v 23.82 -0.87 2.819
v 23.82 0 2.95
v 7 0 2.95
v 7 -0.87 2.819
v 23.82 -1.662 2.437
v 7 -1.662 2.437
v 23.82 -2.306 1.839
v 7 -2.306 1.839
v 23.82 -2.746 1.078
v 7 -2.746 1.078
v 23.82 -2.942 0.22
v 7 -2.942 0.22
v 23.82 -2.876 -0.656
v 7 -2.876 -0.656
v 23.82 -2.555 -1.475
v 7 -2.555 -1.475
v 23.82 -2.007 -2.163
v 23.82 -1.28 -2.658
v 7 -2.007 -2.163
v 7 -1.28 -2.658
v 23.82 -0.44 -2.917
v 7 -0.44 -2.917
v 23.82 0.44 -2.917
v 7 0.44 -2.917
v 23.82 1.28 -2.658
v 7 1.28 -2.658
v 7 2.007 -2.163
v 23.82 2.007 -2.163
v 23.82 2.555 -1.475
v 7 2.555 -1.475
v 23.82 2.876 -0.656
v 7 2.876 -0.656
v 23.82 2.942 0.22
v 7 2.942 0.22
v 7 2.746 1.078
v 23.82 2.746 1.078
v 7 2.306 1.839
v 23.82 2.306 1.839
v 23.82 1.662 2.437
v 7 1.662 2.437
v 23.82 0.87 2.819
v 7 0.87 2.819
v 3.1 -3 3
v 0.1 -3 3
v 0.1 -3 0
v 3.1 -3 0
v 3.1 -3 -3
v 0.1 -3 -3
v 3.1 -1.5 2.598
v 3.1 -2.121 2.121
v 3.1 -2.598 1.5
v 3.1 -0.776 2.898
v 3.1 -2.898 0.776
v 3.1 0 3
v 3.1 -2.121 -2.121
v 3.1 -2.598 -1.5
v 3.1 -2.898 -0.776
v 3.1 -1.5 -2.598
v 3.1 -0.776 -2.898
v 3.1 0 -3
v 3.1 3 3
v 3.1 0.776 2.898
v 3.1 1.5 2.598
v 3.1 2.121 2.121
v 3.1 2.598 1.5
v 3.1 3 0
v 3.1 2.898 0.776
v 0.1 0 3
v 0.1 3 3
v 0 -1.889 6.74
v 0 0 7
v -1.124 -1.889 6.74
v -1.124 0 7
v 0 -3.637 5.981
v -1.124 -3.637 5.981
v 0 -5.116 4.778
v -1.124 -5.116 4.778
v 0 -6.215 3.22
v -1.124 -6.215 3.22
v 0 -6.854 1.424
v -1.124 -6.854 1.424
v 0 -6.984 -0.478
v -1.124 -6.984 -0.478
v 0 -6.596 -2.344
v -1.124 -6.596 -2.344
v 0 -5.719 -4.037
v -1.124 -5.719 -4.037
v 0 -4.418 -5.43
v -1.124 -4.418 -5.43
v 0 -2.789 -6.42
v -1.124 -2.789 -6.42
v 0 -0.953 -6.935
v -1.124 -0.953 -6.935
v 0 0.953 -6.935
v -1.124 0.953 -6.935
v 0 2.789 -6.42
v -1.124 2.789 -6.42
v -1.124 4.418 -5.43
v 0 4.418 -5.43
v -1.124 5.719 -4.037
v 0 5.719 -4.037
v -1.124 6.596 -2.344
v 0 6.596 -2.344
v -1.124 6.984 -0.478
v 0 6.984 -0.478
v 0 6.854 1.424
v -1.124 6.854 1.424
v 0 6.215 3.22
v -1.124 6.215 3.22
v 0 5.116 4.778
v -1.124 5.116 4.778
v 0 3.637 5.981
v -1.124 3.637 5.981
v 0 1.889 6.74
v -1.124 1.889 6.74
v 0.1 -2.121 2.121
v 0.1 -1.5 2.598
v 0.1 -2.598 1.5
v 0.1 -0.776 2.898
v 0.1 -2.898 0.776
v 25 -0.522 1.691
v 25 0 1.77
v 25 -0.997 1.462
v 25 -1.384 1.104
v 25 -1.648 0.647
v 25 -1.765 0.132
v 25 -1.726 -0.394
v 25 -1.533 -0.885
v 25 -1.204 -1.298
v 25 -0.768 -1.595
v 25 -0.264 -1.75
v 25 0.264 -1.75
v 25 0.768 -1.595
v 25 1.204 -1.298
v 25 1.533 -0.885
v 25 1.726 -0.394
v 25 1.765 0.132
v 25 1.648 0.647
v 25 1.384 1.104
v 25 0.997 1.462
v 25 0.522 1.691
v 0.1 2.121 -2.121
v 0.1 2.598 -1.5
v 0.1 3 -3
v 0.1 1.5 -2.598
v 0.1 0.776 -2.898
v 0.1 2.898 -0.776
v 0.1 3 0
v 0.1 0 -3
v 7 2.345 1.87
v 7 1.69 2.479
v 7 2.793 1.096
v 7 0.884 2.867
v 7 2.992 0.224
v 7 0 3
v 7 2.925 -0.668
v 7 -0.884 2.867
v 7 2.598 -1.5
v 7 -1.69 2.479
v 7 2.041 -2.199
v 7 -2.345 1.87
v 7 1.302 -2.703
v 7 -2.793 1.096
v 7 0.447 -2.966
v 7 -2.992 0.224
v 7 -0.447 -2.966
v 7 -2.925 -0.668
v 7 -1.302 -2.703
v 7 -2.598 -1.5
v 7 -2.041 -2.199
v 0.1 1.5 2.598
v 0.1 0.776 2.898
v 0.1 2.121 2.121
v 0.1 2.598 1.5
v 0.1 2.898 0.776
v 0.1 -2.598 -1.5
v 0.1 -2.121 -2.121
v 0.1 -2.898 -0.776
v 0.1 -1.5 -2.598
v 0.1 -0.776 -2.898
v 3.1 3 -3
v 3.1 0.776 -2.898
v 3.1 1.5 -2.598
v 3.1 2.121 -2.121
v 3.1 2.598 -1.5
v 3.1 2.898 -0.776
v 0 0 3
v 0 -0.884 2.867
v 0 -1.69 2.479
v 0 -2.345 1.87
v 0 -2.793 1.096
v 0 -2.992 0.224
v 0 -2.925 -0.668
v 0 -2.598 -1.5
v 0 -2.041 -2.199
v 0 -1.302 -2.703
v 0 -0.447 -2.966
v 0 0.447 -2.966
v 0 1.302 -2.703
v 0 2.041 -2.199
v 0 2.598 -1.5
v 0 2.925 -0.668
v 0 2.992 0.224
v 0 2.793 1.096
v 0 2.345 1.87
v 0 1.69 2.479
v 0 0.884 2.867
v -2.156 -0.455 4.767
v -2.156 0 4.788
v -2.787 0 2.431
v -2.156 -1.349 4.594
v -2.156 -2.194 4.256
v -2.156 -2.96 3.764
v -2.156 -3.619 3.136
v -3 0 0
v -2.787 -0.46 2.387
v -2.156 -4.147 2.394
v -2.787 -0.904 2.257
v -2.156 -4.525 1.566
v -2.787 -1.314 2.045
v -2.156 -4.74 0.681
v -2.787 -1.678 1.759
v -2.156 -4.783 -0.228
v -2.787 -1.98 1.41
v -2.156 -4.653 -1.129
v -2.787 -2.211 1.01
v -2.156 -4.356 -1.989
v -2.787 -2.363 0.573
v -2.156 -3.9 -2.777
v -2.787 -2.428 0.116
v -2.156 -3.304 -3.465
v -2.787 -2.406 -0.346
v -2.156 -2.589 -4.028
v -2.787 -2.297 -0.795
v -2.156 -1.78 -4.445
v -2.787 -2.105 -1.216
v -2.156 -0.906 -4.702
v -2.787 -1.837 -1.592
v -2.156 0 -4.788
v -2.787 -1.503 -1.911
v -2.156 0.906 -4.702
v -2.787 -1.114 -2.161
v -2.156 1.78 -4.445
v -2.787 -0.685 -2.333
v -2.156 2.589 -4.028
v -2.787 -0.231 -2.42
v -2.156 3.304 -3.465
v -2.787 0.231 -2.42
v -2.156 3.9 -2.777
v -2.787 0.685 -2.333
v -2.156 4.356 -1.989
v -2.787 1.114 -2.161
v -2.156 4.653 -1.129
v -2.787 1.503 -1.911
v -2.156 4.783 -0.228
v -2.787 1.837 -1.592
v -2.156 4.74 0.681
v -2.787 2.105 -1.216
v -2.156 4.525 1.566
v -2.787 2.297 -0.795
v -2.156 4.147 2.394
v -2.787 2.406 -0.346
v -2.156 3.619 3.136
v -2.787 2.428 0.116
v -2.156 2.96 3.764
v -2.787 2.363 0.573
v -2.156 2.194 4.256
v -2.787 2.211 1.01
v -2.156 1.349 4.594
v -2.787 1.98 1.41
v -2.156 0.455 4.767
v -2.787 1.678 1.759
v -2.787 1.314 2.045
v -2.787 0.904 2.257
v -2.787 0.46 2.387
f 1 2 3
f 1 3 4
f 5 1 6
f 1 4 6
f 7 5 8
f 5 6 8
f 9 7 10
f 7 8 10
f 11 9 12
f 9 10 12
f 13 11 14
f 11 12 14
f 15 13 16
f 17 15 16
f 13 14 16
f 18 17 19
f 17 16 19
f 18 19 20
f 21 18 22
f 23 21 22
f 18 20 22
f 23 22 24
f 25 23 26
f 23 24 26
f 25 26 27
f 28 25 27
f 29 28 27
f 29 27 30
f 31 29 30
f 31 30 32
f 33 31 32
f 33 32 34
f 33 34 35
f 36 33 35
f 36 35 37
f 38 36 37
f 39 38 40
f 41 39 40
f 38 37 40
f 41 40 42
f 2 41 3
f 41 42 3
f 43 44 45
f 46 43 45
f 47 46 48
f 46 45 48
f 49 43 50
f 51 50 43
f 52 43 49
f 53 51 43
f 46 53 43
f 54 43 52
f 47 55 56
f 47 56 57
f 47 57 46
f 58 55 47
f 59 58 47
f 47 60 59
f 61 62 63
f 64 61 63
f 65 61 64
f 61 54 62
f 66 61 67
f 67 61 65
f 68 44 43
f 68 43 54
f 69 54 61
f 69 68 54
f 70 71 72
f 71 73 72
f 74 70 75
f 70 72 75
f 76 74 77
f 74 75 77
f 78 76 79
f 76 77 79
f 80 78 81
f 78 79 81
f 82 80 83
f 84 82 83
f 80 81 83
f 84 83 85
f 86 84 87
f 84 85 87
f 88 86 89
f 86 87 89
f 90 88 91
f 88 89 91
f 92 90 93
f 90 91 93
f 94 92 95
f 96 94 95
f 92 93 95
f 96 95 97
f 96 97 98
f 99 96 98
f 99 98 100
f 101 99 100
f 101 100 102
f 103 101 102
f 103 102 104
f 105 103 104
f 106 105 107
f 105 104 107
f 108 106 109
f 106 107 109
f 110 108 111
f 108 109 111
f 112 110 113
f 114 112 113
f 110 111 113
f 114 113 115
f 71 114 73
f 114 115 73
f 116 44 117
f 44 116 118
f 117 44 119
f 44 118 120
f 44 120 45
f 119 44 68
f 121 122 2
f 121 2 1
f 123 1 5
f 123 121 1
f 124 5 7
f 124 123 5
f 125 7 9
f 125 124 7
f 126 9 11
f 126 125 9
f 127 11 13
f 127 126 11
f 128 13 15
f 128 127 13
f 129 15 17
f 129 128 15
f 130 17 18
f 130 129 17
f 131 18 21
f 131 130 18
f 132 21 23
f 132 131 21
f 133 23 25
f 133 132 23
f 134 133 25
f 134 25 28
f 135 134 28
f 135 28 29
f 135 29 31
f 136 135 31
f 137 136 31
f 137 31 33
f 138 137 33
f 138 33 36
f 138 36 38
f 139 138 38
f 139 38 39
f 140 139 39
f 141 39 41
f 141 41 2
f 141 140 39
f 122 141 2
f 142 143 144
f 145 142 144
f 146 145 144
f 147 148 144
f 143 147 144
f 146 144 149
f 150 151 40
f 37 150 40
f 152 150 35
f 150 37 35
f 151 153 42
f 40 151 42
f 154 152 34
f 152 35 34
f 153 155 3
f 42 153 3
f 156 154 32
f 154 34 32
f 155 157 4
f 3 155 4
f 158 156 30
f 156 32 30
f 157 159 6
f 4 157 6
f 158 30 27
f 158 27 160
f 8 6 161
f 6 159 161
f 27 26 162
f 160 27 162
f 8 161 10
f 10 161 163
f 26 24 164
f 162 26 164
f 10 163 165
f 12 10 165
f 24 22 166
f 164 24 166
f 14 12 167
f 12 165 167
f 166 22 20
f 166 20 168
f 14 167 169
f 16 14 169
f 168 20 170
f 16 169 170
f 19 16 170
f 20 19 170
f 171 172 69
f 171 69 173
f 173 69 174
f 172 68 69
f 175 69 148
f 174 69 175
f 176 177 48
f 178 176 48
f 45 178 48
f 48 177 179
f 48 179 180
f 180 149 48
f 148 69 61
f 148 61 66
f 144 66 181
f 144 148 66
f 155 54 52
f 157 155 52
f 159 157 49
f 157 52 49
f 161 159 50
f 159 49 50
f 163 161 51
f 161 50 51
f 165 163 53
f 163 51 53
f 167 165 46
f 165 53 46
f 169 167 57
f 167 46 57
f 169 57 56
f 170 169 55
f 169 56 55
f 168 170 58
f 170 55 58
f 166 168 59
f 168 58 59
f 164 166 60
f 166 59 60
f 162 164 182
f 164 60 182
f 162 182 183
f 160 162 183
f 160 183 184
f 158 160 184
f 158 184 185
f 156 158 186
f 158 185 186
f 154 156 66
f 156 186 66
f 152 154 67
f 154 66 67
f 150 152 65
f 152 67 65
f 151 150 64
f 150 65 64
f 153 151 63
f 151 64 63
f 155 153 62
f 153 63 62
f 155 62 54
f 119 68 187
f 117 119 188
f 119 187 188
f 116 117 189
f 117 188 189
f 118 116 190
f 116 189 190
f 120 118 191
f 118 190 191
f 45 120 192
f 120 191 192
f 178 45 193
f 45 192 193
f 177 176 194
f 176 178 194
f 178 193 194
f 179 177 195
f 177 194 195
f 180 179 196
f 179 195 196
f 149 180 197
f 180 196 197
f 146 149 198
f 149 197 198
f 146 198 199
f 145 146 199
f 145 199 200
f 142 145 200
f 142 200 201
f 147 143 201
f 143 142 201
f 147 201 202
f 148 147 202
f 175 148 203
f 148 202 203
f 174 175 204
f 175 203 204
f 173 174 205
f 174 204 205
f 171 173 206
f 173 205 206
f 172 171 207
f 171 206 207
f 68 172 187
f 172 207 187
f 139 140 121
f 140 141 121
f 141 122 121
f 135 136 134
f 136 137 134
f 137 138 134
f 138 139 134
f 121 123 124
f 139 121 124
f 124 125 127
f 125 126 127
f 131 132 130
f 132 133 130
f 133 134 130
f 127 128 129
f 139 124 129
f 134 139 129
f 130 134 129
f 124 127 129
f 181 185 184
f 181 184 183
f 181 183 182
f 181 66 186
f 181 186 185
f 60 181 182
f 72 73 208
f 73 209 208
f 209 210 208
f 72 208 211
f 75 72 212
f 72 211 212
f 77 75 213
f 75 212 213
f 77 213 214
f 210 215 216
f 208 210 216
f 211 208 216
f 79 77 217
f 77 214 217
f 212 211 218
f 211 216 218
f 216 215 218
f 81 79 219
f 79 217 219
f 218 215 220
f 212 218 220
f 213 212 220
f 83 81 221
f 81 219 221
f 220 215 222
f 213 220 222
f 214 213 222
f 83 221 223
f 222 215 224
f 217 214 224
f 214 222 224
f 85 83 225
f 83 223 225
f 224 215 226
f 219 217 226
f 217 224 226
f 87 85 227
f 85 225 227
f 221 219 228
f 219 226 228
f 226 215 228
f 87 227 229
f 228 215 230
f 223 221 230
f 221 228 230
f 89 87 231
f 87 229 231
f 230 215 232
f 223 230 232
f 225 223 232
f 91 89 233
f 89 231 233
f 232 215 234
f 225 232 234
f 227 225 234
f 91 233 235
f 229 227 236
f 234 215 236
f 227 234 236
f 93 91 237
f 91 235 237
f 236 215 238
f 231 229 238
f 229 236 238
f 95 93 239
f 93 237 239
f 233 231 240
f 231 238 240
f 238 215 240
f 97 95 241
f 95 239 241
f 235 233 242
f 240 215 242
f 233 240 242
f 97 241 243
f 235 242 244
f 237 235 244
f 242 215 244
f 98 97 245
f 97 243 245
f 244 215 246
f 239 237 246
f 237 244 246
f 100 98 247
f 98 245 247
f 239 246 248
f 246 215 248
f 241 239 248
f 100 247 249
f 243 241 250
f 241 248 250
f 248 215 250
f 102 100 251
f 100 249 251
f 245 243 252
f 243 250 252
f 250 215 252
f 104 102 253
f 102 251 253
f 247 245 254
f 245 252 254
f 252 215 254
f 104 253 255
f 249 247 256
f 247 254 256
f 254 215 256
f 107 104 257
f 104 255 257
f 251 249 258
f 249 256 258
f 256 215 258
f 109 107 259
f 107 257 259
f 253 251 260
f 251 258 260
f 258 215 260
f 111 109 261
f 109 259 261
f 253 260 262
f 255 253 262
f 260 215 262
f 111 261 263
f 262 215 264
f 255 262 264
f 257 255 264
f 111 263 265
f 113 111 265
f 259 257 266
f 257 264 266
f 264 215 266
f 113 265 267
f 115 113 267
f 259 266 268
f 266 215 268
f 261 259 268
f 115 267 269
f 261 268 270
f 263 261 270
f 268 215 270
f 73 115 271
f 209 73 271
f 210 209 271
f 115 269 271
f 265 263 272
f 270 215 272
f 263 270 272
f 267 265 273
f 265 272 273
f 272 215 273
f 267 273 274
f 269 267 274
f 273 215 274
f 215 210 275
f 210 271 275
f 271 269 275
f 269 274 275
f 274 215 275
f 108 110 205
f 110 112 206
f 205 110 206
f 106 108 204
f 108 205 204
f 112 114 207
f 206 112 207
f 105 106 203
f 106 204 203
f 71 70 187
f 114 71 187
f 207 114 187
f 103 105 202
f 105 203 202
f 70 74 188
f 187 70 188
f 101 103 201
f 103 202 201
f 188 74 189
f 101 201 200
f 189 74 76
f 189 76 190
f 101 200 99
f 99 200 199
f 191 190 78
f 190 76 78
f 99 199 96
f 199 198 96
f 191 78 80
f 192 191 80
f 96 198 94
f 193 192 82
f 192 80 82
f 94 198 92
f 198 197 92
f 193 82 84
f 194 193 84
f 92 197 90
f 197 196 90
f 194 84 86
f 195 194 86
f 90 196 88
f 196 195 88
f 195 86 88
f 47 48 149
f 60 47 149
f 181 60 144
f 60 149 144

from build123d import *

# Parameters (mm, degrees)
EXTRUDE_START   = 0.1
SKETCH_2_W      = 6
SKETCH_2_H      = 6
EXTRUDE_1_DEPTH = 3
CHAMFER_1_SIZE  = 1.18


with BuildPart() as part:
    # Эскиз1 → Повернуть1 (revolve)
    with BuildSketch(Plane.XY, mode=Mode.PRIVATE) as revolve_1_sk:
        with BuildLine():
            Line((25, 0), (25, 2.95))
            Line((25, 2.95), (7, 2.95))
            Line((7, 2.95), (7, 3))
            Line((7, 3), (0, 3))
            Line((0, 3), (0, 7))
            Line((0, 7), (-1.124355653, 7))
            ThreePointArc((-1.124355653, 7), (-2.522961568, 3.623466631), (-3, 0))
            Line((-3, 0), (25, 0))
        make_face()
    revolve(revolve_1_sk.sketch.rotate(Axis((-121.430503085, 0, 0), (1, 0, 0)), 90), axis=Axis((-121.430503085, 0, 0), (1, 0, 0)))

    # Эскиз2 → Бобышка-Вытянуть1 (add)
    with BuildSketch(Plane(origin=(0, 0, 0), x_dir=(0, 0, -1), z_dir=(1, 0, 0)).offset(EXTRUDE_START)):
        Rectangle(SKETCH_2_W, SKETCH_2_H)
    extrude(amount=EXTRUDE_1_DEPTH)

    # Фаска1
    chamfer_1_edges = [part.edges().sort_by_distance(p)[0] for p in [
        (25, 0, -2.95),
    ]]
    chamfer(chamfer_1_edges, length=CHAMFER_1_SIZE)


solid = part.part
